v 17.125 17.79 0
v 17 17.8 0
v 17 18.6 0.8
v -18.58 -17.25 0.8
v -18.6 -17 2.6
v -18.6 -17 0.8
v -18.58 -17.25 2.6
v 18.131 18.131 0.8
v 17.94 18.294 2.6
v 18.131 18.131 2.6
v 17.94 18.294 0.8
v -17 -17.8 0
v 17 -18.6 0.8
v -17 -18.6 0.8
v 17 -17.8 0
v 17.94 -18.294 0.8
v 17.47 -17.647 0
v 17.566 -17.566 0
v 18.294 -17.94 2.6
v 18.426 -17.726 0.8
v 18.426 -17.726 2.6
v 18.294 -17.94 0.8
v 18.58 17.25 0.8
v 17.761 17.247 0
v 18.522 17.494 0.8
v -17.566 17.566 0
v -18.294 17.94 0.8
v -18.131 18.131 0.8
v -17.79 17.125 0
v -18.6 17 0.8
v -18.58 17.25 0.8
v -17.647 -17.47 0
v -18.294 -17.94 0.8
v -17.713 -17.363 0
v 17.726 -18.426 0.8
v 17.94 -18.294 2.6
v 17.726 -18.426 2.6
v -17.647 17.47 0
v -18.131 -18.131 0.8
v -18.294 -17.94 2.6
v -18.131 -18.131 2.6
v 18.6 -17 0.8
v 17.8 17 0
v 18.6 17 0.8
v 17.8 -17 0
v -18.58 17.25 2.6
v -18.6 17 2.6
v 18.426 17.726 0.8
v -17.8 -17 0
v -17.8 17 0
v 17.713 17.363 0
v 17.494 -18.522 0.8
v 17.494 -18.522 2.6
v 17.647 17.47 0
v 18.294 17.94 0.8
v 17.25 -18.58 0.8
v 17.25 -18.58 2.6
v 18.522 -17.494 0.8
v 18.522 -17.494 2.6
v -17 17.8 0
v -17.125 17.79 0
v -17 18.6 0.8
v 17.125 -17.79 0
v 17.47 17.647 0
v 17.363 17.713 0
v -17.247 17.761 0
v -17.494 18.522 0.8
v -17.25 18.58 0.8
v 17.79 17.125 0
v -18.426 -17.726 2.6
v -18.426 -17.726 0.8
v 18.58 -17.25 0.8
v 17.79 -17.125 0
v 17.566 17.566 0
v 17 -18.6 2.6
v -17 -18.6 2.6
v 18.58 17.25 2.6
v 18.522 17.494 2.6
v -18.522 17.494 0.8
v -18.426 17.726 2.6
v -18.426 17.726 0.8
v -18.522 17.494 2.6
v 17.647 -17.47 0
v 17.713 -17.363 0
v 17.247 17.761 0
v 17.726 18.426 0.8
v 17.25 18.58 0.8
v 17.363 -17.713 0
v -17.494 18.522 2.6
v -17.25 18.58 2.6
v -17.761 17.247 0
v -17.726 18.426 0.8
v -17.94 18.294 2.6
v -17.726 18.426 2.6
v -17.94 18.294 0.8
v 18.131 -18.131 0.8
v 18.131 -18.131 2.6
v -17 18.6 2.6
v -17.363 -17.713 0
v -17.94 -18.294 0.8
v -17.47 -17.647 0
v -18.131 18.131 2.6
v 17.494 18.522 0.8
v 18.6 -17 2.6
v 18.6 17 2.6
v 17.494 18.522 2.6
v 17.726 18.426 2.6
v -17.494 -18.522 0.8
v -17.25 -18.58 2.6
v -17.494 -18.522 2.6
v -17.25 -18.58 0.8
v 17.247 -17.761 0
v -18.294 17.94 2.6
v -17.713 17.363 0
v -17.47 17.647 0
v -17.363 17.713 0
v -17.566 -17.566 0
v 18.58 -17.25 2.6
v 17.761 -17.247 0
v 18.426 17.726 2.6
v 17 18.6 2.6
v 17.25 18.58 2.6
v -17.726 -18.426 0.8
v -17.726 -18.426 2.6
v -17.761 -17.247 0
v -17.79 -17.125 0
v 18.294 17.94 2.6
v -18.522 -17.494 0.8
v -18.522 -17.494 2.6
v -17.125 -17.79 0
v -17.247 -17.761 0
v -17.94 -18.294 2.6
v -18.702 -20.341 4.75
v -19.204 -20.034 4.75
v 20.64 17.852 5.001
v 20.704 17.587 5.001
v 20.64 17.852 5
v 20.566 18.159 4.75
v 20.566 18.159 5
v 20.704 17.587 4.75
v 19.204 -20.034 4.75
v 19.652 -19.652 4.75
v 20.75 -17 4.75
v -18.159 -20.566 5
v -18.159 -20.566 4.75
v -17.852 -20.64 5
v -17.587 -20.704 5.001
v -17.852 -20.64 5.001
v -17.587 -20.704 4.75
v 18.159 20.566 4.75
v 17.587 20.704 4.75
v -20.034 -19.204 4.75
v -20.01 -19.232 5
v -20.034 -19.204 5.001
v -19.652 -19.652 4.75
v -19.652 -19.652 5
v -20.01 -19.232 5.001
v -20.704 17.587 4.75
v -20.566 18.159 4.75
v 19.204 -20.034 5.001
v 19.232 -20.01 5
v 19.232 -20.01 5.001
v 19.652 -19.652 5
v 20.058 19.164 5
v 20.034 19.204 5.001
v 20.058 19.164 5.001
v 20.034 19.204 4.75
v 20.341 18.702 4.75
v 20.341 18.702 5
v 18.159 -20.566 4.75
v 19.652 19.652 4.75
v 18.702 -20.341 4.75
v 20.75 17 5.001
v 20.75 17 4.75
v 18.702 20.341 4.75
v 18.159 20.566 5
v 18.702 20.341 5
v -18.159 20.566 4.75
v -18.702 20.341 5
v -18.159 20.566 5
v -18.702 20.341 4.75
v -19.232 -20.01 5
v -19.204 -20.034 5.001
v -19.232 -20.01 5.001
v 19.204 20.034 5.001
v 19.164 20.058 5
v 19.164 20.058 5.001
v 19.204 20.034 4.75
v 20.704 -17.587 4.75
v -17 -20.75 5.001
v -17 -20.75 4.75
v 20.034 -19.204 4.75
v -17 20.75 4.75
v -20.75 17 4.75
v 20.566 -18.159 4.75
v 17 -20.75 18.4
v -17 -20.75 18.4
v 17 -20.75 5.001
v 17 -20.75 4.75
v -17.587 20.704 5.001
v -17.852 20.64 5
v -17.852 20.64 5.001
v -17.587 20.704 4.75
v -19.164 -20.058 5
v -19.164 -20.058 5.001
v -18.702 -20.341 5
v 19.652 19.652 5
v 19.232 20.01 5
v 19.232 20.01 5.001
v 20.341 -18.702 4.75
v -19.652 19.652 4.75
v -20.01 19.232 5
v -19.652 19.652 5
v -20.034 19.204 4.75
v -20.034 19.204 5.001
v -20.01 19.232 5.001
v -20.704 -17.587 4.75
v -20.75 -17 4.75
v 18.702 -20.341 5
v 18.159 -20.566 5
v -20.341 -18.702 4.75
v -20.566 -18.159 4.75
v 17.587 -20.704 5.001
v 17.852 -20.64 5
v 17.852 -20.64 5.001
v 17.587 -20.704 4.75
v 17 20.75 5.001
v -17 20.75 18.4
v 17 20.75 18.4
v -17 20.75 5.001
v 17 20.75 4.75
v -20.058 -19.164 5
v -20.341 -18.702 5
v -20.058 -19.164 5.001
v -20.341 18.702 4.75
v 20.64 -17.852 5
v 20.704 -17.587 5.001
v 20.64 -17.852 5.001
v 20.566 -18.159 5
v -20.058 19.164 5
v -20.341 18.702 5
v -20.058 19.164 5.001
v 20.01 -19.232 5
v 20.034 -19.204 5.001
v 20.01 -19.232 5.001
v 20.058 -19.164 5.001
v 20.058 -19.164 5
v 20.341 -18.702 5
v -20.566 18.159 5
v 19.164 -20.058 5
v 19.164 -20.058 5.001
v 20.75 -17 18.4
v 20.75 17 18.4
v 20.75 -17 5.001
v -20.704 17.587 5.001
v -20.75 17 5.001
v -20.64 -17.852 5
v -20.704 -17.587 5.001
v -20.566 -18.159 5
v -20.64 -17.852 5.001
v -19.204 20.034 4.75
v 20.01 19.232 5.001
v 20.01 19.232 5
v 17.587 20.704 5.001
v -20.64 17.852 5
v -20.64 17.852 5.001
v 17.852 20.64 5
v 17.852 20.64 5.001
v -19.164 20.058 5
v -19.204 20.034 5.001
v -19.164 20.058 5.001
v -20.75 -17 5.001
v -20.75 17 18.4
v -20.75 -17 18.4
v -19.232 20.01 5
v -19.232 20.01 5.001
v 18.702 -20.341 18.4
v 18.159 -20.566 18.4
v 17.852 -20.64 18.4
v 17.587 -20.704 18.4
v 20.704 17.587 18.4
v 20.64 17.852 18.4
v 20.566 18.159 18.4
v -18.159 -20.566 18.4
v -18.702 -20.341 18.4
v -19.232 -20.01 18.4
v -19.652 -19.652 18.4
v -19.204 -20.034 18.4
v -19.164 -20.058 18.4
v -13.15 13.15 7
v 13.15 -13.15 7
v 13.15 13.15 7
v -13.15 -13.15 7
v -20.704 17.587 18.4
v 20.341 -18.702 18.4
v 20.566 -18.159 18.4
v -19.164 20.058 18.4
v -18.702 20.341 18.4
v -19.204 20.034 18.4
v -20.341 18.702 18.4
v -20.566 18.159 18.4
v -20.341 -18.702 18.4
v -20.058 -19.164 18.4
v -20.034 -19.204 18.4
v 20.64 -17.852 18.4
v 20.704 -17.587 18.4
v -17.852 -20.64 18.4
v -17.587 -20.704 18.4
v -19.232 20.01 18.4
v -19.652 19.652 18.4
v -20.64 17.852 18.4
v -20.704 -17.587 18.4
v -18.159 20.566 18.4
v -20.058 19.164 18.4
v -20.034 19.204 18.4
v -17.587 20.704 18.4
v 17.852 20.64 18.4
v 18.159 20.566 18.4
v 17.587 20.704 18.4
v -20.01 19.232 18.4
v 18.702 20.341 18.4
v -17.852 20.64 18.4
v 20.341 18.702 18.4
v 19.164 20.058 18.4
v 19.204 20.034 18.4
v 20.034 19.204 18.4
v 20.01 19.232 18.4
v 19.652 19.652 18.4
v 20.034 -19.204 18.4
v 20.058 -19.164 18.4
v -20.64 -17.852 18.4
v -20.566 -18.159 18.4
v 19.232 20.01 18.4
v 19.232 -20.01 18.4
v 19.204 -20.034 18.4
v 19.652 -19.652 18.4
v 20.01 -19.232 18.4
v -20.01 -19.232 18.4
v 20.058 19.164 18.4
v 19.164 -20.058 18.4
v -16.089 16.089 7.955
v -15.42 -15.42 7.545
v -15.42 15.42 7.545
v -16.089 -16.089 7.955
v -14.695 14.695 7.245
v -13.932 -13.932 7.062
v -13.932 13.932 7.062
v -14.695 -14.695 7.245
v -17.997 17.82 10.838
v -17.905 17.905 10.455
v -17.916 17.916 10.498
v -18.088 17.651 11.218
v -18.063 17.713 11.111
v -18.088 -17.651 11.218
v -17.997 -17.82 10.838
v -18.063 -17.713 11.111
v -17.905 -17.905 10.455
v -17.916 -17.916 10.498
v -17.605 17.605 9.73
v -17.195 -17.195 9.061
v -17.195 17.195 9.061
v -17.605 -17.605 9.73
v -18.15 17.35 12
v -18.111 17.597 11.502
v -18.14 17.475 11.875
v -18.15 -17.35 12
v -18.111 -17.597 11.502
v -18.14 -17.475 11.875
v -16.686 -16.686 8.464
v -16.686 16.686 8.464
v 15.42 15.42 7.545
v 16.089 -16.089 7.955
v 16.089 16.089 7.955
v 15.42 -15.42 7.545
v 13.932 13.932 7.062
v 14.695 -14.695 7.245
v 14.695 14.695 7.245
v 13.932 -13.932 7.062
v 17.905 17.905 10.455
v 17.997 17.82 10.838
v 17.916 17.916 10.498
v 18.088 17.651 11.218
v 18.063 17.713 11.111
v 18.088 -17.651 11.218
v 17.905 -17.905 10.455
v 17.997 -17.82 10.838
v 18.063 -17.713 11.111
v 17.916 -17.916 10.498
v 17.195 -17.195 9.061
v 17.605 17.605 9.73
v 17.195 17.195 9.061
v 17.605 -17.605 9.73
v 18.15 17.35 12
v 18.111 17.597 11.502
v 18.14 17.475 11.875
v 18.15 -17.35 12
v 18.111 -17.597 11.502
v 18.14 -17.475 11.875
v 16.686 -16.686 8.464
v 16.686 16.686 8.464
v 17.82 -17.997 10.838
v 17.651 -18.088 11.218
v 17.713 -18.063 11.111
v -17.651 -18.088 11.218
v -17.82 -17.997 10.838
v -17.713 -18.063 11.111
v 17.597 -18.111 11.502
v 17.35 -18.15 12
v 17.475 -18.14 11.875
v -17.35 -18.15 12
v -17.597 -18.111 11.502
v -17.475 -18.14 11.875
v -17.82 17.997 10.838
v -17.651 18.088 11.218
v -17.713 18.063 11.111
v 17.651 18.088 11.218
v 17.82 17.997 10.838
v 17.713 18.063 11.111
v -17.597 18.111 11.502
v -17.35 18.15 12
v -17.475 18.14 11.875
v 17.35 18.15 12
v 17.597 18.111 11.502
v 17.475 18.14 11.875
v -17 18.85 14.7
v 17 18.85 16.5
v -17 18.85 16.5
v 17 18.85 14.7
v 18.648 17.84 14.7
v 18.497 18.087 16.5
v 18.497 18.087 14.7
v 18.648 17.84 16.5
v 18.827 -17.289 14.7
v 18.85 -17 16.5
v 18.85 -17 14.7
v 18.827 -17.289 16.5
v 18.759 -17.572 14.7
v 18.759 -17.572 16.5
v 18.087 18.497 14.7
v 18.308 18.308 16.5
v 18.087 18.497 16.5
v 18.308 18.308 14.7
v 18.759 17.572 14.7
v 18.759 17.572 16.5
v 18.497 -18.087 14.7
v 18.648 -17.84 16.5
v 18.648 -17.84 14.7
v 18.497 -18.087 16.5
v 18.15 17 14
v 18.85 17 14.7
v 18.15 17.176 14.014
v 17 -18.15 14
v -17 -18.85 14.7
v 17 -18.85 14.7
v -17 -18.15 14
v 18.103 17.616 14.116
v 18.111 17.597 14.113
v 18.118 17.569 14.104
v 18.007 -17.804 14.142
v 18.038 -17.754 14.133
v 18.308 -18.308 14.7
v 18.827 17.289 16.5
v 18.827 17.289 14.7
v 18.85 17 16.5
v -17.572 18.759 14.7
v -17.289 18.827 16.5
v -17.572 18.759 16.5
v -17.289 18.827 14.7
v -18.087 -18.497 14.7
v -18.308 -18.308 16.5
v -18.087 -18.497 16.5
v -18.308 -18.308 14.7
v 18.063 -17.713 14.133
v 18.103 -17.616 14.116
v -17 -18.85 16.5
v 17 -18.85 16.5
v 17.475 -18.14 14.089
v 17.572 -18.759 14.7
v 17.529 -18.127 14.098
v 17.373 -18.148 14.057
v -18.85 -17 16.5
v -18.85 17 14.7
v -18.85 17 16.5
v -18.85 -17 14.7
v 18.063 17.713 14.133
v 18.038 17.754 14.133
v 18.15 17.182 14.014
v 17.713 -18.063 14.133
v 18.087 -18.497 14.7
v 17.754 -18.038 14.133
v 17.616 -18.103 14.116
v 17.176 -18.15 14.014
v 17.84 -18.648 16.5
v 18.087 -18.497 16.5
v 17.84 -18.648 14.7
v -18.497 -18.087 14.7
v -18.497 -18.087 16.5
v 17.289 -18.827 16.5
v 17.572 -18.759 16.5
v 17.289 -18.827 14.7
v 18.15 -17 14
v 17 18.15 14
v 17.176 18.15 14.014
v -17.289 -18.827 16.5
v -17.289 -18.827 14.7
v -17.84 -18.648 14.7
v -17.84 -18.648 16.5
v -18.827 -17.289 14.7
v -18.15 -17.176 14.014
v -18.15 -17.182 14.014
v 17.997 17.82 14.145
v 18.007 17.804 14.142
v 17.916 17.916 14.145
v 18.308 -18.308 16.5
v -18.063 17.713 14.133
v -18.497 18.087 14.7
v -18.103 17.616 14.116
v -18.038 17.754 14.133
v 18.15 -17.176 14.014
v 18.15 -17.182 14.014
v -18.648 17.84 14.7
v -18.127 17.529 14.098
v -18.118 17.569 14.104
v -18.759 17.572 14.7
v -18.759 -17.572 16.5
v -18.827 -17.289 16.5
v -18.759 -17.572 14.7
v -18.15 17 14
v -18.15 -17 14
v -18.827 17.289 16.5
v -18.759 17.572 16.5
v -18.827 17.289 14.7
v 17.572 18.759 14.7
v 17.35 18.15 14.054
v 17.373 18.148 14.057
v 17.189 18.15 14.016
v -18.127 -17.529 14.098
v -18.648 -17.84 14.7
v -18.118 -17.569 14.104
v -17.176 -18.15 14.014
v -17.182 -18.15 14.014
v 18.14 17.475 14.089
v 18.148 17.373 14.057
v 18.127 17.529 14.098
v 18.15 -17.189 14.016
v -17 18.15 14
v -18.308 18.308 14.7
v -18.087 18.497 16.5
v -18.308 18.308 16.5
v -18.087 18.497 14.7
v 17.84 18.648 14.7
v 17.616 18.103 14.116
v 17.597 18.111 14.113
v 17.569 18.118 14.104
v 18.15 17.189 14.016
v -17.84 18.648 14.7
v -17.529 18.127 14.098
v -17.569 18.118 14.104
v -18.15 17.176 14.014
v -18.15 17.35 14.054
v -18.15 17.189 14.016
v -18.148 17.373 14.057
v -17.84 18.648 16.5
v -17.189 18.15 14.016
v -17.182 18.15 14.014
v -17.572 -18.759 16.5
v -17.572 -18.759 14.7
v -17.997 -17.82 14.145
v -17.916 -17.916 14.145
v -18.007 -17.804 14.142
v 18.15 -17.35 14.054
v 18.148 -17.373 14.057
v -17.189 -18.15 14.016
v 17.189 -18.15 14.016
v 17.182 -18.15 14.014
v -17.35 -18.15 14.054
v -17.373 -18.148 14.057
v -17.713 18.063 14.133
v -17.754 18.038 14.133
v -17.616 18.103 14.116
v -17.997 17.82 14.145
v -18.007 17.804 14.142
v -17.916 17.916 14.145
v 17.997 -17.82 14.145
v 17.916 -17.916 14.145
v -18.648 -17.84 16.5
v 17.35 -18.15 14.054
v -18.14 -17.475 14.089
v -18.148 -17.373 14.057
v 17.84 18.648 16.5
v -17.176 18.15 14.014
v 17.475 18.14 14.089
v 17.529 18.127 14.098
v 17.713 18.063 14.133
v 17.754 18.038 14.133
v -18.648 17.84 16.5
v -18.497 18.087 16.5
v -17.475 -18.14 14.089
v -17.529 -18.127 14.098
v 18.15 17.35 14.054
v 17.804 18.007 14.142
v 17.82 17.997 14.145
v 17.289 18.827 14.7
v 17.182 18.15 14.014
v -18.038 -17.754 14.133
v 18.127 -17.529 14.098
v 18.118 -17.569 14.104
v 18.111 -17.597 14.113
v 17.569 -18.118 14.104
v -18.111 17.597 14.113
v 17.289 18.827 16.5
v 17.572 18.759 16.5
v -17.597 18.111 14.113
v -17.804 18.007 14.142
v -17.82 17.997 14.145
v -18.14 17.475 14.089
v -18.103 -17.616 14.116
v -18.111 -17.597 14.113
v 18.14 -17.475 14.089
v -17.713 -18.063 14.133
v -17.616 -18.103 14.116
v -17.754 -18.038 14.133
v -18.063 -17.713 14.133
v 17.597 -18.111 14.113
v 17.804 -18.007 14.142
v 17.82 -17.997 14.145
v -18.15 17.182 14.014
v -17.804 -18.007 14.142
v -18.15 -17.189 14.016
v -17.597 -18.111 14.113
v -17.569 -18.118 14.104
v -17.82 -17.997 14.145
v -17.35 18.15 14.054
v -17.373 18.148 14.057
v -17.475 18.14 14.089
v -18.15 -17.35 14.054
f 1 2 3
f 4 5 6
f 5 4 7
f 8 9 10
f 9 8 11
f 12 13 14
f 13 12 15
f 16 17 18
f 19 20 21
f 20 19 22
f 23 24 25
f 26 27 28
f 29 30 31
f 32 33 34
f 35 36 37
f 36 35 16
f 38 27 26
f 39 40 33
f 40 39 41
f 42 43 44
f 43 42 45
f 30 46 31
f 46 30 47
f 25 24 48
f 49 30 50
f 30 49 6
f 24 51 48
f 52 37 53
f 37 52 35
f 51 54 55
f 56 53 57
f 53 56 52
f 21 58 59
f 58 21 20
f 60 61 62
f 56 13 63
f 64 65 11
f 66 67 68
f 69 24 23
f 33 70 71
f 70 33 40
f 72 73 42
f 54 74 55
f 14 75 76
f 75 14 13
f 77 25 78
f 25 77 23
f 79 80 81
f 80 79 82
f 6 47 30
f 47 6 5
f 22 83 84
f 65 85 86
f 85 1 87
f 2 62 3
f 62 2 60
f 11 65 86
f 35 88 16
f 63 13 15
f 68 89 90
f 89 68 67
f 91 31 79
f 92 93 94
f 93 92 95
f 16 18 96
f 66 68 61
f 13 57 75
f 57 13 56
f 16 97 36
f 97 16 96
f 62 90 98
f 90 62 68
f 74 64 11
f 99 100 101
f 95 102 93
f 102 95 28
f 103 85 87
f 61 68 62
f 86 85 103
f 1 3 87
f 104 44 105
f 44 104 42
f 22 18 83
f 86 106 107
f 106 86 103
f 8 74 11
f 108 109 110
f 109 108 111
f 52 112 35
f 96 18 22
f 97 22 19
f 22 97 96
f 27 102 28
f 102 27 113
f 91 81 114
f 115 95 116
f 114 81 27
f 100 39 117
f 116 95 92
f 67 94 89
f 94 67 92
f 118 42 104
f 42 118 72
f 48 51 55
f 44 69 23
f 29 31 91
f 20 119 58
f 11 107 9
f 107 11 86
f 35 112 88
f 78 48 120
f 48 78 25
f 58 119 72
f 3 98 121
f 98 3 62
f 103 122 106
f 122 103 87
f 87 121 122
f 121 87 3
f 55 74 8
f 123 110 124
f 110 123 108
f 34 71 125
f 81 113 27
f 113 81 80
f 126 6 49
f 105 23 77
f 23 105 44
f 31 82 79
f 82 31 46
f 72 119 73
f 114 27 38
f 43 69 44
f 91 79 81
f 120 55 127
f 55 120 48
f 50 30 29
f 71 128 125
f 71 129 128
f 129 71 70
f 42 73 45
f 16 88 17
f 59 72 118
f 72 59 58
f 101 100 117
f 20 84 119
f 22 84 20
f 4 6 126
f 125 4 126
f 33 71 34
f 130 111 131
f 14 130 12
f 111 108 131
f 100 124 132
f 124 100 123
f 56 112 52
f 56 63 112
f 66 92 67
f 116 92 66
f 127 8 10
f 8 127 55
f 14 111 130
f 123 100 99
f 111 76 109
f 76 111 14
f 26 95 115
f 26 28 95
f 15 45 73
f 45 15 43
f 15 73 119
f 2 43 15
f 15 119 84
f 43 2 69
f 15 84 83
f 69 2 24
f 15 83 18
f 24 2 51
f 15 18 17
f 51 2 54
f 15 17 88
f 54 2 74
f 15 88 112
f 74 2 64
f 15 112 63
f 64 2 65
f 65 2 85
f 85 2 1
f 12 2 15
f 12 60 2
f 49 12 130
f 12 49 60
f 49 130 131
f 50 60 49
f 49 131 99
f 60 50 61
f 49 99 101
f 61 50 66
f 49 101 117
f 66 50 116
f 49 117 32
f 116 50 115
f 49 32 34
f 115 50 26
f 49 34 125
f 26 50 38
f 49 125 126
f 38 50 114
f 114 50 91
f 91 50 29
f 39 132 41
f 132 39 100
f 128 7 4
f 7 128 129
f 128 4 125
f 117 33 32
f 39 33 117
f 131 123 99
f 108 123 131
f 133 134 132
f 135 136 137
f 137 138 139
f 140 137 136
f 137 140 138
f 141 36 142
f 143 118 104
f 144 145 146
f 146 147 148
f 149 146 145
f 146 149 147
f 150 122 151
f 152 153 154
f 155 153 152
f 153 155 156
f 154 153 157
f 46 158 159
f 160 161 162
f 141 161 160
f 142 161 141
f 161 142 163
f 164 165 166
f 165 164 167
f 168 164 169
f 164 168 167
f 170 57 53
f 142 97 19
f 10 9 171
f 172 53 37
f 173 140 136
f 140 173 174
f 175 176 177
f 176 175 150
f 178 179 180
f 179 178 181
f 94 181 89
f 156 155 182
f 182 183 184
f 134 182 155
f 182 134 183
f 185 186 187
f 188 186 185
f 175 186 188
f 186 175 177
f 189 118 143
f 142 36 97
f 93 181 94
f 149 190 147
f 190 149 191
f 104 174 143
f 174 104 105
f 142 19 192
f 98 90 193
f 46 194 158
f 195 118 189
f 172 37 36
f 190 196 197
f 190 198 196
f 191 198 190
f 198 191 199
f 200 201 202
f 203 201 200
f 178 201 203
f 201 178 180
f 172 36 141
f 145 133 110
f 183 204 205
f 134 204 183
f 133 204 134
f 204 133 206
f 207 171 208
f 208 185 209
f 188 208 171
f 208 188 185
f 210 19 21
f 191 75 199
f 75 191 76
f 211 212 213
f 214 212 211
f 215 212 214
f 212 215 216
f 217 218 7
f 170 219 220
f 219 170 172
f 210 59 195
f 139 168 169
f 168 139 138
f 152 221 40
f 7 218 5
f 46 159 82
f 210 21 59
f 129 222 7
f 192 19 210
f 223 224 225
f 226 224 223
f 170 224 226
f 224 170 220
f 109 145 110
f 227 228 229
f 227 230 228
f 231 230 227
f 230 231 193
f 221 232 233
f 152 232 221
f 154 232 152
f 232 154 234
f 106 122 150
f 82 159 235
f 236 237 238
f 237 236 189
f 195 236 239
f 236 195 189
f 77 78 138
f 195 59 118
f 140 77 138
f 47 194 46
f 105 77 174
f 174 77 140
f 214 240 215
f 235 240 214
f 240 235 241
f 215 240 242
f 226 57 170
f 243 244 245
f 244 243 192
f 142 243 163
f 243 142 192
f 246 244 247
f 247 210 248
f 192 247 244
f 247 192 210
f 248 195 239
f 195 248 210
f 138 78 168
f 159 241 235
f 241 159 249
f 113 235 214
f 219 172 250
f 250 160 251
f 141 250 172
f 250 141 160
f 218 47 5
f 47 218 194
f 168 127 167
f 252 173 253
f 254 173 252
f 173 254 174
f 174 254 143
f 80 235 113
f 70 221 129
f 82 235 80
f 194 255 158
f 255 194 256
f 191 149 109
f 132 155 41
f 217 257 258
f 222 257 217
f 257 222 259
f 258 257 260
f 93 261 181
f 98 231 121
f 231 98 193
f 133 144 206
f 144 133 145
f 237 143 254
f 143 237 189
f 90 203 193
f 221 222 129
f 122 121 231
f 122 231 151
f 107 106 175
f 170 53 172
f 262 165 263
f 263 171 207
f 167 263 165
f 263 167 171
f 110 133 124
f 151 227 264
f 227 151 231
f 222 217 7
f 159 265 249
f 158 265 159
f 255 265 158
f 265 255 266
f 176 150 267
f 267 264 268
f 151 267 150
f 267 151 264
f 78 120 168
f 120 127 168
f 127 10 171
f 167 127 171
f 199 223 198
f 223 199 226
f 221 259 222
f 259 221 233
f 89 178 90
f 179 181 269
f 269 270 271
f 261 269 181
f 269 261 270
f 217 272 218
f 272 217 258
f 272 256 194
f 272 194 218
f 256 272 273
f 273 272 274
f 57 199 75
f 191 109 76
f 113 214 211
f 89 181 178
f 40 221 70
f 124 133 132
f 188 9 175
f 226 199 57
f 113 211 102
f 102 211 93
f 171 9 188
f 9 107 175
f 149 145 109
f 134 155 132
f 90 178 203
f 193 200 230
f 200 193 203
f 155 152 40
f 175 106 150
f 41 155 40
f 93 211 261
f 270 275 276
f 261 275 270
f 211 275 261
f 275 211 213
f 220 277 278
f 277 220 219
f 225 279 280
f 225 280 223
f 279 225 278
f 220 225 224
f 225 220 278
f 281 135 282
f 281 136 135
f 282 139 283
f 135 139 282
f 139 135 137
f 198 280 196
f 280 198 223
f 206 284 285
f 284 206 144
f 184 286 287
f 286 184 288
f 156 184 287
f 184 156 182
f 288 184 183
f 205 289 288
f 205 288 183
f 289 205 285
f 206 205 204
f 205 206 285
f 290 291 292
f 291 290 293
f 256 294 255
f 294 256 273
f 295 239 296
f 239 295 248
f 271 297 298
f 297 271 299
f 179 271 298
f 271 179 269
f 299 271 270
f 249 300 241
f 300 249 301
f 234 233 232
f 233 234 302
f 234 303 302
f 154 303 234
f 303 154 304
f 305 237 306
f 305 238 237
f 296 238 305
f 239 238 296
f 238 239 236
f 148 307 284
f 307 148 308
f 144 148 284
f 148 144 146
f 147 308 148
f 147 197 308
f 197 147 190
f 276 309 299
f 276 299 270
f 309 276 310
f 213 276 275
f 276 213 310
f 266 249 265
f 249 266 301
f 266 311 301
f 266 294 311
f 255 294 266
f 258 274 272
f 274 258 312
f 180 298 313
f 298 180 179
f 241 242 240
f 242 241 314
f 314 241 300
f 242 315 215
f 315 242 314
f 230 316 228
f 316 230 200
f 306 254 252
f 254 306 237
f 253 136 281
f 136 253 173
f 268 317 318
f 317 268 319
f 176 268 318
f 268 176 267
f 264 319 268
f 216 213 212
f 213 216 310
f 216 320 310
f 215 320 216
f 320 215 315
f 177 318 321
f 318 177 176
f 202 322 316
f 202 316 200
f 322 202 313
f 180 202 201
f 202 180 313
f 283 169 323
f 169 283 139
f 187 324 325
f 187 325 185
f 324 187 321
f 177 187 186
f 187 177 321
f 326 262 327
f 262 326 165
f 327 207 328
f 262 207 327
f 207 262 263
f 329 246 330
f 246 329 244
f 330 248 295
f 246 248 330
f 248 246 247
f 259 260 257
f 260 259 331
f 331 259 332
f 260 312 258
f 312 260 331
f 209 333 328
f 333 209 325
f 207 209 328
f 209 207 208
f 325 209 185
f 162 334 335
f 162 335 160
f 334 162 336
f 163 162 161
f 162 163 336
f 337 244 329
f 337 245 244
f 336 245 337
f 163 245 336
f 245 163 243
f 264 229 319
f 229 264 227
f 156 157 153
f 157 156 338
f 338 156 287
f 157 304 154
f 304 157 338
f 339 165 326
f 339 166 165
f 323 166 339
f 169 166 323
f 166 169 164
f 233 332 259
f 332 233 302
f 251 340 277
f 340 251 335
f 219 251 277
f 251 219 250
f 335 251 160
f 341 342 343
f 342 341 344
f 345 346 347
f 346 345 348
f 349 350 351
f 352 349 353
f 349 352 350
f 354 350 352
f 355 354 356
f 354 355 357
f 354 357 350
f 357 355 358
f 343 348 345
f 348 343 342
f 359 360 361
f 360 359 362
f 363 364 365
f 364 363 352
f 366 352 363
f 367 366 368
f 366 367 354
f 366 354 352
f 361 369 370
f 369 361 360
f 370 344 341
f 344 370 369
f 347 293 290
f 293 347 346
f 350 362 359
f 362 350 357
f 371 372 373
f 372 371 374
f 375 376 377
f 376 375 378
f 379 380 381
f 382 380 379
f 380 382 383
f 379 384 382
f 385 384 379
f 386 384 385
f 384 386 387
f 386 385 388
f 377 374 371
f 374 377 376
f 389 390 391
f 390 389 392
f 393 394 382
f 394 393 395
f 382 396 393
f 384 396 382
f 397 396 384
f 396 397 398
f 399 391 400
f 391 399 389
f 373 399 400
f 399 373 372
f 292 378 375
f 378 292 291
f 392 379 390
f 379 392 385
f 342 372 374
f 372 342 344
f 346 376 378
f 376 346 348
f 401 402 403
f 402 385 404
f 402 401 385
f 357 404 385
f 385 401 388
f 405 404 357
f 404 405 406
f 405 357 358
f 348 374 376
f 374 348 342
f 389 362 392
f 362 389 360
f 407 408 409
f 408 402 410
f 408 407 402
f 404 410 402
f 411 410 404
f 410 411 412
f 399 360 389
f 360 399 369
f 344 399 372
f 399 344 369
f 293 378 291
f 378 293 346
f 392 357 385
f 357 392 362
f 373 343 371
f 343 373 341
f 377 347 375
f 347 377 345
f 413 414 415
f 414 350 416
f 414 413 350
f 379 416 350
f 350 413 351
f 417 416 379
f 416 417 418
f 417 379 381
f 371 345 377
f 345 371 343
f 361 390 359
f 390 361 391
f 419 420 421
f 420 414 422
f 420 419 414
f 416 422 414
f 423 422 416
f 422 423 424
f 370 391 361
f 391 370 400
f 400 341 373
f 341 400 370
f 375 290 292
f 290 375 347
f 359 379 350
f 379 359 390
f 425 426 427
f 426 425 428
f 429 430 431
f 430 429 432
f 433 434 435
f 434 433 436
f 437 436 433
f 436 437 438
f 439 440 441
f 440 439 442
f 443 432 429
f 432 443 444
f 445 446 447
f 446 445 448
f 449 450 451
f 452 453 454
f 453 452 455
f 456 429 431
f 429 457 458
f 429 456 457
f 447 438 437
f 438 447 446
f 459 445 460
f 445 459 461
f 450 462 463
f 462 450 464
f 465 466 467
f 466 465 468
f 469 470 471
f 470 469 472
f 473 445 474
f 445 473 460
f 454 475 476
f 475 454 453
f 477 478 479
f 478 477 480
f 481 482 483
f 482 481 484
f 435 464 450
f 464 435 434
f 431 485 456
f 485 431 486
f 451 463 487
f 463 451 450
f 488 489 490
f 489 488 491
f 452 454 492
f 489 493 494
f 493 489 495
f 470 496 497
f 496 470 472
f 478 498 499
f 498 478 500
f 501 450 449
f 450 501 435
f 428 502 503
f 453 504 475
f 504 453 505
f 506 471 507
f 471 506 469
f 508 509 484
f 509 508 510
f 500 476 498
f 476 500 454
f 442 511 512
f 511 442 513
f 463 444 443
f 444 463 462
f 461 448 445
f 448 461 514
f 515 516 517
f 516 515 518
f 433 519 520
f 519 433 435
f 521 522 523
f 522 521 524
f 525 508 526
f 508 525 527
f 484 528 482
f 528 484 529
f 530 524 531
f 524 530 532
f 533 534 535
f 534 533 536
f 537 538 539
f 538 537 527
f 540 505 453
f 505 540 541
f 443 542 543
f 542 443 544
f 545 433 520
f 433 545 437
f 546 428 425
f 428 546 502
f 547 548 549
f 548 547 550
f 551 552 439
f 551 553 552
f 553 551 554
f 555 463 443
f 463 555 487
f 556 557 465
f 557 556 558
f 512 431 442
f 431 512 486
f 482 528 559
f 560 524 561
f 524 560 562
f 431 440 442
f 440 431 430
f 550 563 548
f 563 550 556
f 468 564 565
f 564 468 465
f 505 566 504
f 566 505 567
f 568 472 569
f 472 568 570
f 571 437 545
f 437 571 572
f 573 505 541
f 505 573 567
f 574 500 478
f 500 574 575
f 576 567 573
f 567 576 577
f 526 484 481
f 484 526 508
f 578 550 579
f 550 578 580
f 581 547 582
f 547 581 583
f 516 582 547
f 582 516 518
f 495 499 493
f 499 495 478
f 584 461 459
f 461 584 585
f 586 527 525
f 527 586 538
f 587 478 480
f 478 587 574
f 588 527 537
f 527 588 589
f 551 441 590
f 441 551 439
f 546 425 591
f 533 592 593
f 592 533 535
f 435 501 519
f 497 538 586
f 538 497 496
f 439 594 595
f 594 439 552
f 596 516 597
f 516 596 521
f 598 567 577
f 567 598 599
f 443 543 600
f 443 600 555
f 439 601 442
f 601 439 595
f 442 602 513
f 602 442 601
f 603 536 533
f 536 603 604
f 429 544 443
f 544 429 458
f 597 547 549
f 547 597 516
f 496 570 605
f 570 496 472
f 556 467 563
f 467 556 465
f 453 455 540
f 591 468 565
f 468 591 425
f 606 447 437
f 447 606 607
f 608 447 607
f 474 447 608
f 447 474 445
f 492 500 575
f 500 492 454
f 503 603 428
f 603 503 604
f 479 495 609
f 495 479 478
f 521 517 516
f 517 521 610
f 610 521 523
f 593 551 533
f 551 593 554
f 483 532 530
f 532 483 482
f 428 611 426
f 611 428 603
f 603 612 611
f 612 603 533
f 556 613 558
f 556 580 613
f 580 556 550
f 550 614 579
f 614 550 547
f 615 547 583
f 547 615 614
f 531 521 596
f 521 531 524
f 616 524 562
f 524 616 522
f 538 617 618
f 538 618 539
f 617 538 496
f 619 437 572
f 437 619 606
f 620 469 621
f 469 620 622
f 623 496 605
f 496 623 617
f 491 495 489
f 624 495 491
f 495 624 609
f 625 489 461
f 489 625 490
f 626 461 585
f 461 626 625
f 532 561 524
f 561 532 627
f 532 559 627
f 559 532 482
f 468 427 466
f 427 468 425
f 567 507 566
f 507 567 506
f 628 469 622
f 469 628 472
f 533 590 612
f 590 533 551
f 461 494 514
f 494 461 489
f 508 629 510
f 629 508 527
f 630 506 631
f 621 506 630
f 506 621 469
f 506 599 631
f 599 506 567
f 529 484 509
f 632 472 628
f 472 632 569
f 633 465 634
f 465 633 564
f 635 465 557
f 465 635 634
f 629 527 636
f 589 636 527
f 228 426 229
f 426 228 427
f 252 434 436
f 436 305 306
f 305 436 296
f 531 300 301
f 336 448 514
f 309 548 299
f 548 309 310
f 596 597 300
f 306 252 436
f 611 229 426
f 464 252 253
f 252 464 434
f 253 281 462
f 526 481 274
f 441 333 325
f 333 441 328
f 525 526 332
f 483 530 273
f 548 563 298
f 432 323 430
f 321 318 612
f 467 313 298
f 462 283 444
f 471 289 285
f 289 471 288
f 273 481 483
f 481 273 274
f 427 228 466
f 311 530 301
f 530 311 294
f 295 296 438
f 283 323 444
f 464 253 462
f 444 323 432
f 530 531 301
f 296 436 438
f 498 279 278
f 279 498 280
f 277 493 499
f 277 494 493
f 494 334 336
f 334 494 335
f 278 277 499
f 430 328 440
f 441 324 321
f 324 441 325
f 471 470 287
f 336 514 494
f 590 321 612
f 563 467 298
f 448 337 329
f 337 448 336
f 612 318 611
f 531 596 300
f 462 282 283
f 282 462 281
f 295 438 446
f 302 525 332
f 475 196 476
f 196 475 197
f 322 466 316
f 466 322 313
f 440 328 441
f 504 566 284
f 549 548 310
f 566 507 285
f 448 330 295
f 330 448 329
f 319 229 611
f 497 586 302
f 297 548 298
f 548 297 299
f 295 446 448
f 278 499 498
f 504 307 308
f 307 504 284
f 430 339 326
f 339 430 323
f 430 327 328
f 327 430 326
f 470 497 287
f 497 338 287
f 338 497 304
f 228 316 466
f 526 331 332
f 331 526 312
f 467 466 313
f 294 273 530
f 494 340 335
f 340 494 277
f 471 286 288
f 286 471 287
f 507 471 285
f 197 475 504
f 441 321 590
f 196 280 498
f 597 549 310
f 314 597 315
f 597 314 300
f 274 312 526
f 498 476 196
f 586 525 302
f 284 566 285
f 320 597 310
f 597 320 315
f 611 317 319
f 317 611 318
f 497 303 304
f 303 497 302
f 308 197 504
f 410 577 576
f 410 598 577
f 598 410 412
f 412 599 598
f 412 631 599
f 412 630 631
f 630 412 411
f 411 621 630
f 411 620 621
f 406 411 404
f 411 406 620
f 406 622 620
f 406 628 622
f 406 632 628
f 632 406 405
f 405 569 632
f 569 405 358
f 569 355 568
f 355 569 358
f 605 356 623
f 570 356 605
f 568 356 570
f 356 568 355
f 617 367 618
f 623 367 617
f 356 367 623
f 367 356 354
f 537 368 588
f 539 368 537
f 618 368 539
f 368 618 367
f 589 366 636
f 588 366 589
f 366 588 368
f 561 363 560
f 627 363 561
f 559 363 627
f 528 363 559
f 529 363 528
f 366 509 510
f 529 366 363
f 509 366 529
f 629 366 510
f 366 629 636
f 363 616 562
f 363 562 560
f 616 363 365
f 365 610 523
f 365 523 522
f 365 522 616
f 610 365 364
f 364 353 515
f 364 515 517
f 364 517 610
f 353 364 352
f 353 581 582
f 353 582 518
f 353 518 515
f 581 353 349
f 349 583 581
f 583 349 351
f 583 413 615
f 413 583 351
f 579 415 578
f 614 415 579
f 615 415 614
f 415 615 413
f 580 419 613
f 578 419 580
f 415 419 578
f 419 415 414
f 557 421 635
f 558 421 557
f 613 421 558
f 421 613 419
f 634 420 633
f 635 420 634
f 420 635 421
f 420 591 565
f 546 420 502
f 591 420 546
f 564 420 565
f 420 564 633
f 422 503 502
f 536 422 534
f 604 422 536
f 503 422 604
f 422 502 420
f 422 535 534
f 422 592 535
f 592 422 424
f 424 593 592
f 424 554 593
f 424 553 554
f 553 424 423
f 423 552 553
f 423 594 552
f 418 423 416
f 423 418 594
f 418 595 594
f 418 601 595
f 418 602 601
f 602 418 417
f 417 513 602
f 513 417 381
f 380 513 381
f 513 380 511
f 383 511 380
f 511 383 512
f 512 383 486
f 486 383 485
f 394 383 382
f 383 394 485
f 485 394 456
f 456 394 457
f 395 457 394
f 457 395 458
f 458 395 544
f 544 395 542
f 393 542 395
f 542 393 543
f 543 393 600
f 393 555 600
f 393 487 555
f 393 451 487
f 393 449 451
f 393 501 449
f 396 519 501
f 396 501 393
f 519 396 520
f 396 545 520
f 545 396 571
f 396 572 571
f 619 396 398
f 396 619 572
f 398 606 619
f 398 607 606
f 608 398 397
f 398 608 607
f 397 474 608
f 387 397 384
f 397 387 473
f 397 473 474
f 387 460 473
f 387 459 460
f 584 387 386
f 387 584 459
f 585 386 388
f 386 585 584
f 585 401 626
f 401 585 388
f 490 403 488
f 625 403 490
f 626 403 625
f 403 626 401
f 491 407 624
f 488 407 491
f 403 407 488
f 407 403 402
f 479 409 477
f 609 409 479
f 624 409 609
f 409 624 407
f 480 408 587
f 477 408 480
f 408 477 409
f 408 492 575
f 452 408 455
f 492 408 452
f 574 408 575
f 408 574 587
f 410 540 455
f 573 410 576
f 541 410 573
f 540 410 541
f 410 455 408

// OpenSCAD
// Gridfinity Module Generator
// Copyright 2023 Chris Cogdon
// Licence: CC-BY-SA-3.0
// https://www.github.com/chmarr/gridfinity-boxes

$fn=40;
epsilon = 0.001; // a small value to make difference() look nice.

// Constants derived from spec sheet
module_side=41.5;
module_radius_1=3.75;  // because using diameters for fillets is non-standard.
module_radius_2=1.6;
module_radius_3=0.8;
module_base_height=5;
module_spacing=42;
module_unit_height=7;
module_internal_square = module_side - 2*module_radius_1;
internals_radius = module_radius_3;
internals_side=module_side - 2*(1.9 + 0.7);

function coalesce(a, b) = a == undef ? b : a;
function module_dim(count) = [module_side+(count.x-1)*module_spacing, module_side + (count.y-1) * module_spacing];
function internals_dim(count) = [internals_side+(count.x-1)*module_spacing, internals_side+(count.y-1)*module_spacing];
function module_internal_dim(count) = [module_internal_square+(count.x-1)*module_spacing, module_internal_square+(count.y-1)*module_spacing];
function add_point_and_number(dim, addition) = [dim.x+addition, dim.y+addition];

module rounded_wedge(size, radius1, radius2, external=false){
    radius2_ = radius2 == undef ? radius1 : radius2;
    x = external ? size.x : size.x - radius1;
    y = external ? size.y : size.y - radius1;
    minkowski(){
        cube([x, y, epsilon]);
        cylinder(r1=radius1, r2=radius2_, h=size.z);
    }  
}

module isolated_fillet(radius, length) {
    difference() {
        cube([radius, radius, length]);
        translate([radius, radius, -epsilon])
            cylinder(r=radius, h=length + 2*epsilon);
    }
}

module gridfinity_insert () {
    // Constants derived from spec sheet.
    height_0 = module_radius_2-module_radius_3; // heights also become radii as angles are 45deg.
    height_1 = 1.8;
    height_2 = module_radius_1-module_radius_2;
    // This part should not be necessary, but included to add tolerance to
    // the peak of the gridfinity base.
    height_3 = module_base_height - height_0 - height_1 - height_2;
    translate([-module_internal_square/2, -module_internal_square/2]) {
        translate([0, 0, 0])
        rounded_wedge([module_internal_square, module_internal_square, height_0], height_0, 2*height_0, external=true);
        translate([0, 0, height_0])
            rounded_wedge([module_internal_square, module_internal_square, height_1], 2*height_0, external=true);
        translate([0, 0, height_0+height_1])
            rounded_wedge([module_internal_square, module_internal_square, height_2], 2*height_0, 2*height_0 + height_2, external=true);
        translate([0, 0, height_0+height_1+height_2])
            rounded_wedge([module_internal_square, module_internal_square, height_3], 2*height_0 + height_2, external=true);
    }
}

module gridfinity_module_outline(count) {
    translate([-module_side/2 + module_radius_1, -module_side/2 + module_radius_1])
        offset(r=module_radius_1)
        square([module_side + (count.x-1) * module_spacing - 2*module_radius_1,
            module_side + (count.y-1) * module_spacing - 2*module_radius_1]);
}

module gridfinity_module_mass(count, height, z_offset=module_unit_height) {
    // Height and z_offset should typically be a multiple of 7.
    translate([0,0, z_offset])
        linear_extrude(height=height)
        gridfinity_module_outline(count);
}

module gridfinity_internals_outline(count){
    translate([-internals_side/2 + internals_radius, -internals_side/2 + internals_radius])
        offset(r=internals_radius)
        square(add_point_and_number(internals_dim(count), -2*internals_radius));
}

module gridfinity_internals_mass(count, height, z_offset=module_unit_height, radius=0) {
    translate([0, 0, z_offset])
        linear_extrude(height=height)
            gridfinity_internals_outline(count);
    internals = internals_dim(count);
    if ( radius > 0 ) {
        // x=0 side
        translate([-internals_side/2, internals.y - internals_side/2, height + z_offset])
            rotate([90, 0, 0])
            isolated_fillet(radius, internals.y);
        // x=N side
        translate([internals.x - internals_side/2, -internals_side/2, height + z_offset])
            rotate([90,0,180])
            isolated_fillet(radius, internals.y);
        // y=0 side
        translate([-internals_side/2, -internals_side/2, height + z_offset])
            rotate([90,0,90])
            isolated_fillet(radius, internals.x);
        // y=N side
        translate([internals.x - internals_side/2, internals.y - internals_side/2, height + z_offset])
            rotate([90,0,-90])
            isolated_fillet(radius, internals.x);
    }
}

module gridfinity_wall_outline(count) {
    difference(){
        gridfinity_module_outline(count);
        gridfinity_internals_outline(count);
    }
}

module gridfinity_wall(count, height, z_offset=module_unit_height) {
    // Height and z_offset should be multiple of 7.
    translate([0, 0, z_offset])
        linear_extrude(height=height)
        gridfinity_wall_outline(count);
}

module gridfinity_module_base(count) {
    plane_height = module_unit_height - module_base_height;
    for(x=[0:count.x-1]) {
        for(y=[0:count.y-1]) {
            translate([x * module_spacing, y*module_spacing])
                gridfinity_insert();
        }
    }
    gridfinity_module_mass(count, plane_height, module_base_height);
}

module gridfinity_stacking_lip(count, z_offset) {
    // Constants derived from spec sheet
    height_3 = 1.9;
    radius_3 = module_radius_1;
    height_2 = 1.8;
    radius_2 = radius_3 - height_3;
    height_1 = 0.7;
    radius_1 = radius_2;
    radius_0 = radius_1 - height_1;
    base = module_internal_dim(count);
    stacking_lip_height = height_1 + height_2 + height_3; // 4.4mm
    translate([0,0,z_offset])
    difference () {
        linear_extrude(height=stacking_lip_height)
            gridfinity_wall_outline(count);
        translate([-module_internal_square/2, -module_internal_square/2]) {
            rounded_wedge([base.x, base.y, height_1], radius_0, radius_1, external=true);
            translate([0, 0, height_1])
                rounded_wedge([base.x, base.y, height_2], radius_1, radius_2, external=true);
            translate([0, 0, height_1 + height_2])
                rounded_wedge([base.x, base.y, height_3], radius_2, radius_3, external=true);
        }
    }
}


count=[1,1];
gridfinity_module_base(count);
gridfinity_wall(count, 7);
gridfinity_internals_mass(count,0, radius=5);
gridfinity_stacking_lip(count,14);
